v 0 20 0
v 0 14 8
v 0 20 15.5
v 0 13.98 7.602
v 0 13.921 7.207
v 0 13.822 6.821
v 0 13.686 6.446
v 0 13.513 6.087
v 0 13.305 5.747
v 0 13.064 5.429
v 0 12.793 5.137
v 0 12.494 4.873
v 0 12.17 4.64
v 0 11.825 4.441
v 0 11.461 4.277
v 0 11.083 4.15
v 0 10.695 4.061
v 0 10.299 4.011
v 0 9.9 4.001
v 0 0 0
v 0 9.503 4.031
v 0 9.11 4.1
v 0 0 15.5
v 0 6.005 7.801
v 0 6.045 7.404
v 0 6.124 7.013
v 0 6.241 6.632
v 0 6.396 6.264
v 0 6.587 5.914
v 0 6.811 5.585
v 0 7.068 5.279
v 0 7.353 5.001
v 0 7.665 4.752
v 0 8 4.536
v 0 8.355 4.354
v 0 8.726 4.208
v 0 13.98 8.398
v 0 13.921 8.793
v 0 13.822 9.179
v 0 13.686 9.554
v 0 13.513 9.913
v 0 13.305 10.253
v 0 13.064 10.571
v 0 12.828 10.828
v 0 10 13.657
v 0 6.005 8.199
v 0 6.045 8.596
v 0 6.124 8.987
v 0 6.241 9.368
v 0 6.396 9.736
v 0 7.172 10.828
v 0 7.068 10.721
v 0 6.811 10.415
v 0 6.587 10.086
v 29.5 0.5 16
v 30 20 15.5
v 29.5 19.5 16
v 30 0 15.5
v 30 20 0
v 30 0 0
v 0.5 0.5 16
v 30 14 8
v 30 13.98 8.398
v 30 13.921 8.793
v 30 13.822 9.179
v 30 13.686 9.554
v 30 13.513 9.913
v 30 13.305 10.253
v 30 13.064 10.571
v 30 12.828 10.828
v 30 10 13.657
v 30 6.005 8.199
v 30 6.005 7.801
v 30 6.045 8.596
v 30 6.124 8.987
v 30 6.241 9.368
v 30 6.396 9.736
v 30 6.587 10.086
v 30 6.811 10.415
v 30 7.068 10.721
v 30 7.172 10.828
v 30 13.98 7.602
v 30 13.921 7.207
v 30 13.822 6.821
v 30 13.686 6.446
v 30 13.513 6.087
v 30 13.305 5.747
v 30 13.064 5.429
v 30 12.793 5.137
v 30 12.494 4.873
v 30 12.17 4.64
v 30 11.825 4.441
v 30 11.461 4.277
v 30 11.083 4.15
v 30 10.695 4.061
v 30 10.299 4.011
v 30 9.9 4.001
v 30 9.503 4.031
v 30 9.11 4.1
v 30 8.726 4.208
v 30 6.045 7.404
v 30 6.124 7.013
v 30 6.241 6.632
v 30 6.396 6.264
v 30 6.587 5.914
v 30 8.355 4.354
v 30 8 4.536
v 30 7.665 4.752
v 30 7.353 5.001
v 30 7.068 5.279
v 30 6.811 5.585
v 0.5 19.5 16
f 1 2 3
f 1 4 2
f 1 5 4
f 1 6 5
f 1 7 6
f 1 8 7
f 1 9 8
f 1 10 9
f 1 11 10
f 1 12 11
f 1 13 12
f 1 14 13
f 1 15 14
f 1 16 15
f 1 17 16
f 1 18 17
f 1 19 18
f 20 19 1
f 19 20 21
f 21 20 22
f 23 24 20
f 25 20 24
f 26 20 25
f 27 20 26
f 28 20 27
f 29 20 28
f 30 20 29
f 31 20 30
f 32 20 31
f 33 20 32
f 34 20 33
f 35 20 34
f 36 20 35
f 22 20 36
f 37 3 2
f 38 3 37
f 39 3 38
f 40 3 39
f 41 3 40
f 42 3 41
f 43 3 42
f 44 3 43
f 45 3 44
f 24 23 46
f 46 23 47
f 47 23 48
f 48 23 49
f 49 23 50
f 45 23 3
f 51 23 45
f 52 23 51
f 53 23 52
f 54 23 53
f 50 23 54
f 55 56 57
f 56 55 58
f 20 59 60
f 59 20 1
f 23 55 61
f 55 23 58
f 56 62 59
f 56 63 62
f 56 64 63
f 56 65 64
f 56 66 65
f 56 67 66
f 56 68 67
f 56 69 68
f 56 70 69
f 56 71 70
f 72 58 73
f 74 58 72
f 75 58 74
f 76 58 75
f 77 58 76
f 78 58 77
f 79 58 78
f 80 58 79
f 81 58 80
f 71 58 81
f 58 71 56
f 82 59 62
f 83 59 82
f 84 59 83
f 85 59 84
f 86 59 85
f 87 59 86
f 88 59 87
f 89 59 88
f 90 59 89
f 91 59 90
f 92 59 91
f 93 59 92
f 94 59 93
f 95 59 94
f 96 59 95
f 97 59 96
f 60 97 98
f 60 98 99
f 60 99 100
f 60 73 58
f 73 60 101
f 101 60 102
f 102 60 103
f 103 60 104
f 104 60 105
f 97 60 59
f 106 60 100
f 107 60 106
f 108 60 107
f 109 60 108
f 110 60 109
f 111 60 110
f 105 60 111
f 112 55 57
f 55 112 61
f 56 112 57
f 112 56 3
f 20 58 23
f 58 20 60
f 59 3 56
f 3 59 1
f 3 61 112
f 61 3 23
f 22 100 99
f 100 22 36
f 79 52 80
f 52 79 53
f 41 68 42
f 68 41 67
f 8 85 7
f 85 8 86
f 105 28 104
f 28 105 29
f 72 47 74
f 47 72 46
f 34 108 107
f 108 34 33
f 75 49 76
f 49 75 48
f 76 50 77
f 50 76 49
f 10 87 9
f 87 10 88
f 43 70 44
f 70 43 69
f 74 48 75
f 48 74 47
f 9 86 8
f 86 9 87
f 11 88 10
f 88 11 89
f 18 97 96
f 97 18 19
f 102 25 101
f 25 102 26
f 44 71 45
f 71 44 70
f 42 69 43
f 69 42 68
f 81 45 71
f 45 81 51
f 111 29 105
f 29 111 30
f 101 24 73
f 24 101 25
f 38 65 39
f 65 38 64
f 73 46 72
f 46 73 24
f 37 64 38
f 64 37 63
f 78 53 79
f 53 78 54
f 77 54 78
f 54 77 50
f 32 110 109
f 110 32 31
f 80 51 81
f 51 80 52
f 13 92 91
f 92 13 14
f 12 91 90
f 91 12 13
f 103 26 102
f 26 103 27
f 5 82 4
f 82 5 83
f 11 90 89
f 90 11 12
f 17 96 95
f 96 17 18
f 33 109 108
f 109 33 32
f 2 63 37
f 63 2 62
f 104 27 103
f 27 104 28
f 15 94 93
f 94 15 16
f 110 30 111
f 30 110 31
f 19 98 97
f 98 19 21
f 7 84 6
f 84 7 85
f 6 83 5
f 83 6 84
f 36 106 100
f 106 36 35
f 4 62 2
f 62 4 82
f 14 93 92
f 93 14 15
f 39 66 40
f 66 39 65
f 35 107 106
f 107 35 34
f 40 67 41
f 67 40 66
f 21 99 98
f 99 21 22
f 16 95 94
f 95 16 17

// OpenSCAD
// Horizontal FDM hole (MIT). Inline teardrop_2d / teardrop_hole into model.scad.
// Apex toward +Z after teardrop_hole so the roof is 45° (no bridge).
$fa = 4;
$fs = 0.4;

/* [Block] */

// Block length along the hole axis X (mm).
block_length = 30; // [16:1:60]

// Block width along Y (mm).
block_width = 20; // [12:1:40]

// Block height along Z (mm).
block_height = 16; // [12:1:30]

// Horizontal hole diameter (mm).
hole_diameter = 8; // [4:0.5:14]

/* [Rendering] */

// Mid-tone preview color.
block_color = "#3D6B7A"; // color

/* [Hidden] */

// Bed-face chamfer (elephant-foot relief).
bed_chamfer = 0.5;

teardrop_block();

module teardrop_block(
    block_length = block_length,
    block_width = block_width,
    block_height = block_height,
    hole_diameter = hole_diameter,
    block_color = block_color,
    bed_chamfer = bed_chamfer
) {
    color(block_color)
    difference() {
        hull() {
            cube([block_length, block_width, block_height - bed_chamfer]);
            translate([bed_chamfer, bed_chamfer, 0])
                cube([
                    block_length - 2 * bed_chamfer,
                    block_width - 2 * bed_chamfer,
                    block_height
                ]);
        }
        translate([-0.1, block_width / 2, block_height / 2])
            teardrop_hole(d = hole_diameter, length = block_length + 0.2);
    }
}

// --- copy from here (MIT horizontal teardrop) ---

// 2D profile in XY. Apex on +Y (45° tangents from the circle).
module teardrop_2d(d) {
    r = d / 2;
    hull() {
        circle(r = r);
        polygon([
            [0, r * sqrt(2)],
            [ r * cos(45), r * sin(45)],
            [-r * cos(45), r * sin(45)]
        ]);
    }
}

// Cutter along +X. Apex toward +Z (print roof). Subtract this from a solid.
module teardrop_hole(d, length) {
    rotate([90, 0, 90])
        linear_extrude(height = length)
            teardrop_2d(d);
}

// --- copy until here ---
